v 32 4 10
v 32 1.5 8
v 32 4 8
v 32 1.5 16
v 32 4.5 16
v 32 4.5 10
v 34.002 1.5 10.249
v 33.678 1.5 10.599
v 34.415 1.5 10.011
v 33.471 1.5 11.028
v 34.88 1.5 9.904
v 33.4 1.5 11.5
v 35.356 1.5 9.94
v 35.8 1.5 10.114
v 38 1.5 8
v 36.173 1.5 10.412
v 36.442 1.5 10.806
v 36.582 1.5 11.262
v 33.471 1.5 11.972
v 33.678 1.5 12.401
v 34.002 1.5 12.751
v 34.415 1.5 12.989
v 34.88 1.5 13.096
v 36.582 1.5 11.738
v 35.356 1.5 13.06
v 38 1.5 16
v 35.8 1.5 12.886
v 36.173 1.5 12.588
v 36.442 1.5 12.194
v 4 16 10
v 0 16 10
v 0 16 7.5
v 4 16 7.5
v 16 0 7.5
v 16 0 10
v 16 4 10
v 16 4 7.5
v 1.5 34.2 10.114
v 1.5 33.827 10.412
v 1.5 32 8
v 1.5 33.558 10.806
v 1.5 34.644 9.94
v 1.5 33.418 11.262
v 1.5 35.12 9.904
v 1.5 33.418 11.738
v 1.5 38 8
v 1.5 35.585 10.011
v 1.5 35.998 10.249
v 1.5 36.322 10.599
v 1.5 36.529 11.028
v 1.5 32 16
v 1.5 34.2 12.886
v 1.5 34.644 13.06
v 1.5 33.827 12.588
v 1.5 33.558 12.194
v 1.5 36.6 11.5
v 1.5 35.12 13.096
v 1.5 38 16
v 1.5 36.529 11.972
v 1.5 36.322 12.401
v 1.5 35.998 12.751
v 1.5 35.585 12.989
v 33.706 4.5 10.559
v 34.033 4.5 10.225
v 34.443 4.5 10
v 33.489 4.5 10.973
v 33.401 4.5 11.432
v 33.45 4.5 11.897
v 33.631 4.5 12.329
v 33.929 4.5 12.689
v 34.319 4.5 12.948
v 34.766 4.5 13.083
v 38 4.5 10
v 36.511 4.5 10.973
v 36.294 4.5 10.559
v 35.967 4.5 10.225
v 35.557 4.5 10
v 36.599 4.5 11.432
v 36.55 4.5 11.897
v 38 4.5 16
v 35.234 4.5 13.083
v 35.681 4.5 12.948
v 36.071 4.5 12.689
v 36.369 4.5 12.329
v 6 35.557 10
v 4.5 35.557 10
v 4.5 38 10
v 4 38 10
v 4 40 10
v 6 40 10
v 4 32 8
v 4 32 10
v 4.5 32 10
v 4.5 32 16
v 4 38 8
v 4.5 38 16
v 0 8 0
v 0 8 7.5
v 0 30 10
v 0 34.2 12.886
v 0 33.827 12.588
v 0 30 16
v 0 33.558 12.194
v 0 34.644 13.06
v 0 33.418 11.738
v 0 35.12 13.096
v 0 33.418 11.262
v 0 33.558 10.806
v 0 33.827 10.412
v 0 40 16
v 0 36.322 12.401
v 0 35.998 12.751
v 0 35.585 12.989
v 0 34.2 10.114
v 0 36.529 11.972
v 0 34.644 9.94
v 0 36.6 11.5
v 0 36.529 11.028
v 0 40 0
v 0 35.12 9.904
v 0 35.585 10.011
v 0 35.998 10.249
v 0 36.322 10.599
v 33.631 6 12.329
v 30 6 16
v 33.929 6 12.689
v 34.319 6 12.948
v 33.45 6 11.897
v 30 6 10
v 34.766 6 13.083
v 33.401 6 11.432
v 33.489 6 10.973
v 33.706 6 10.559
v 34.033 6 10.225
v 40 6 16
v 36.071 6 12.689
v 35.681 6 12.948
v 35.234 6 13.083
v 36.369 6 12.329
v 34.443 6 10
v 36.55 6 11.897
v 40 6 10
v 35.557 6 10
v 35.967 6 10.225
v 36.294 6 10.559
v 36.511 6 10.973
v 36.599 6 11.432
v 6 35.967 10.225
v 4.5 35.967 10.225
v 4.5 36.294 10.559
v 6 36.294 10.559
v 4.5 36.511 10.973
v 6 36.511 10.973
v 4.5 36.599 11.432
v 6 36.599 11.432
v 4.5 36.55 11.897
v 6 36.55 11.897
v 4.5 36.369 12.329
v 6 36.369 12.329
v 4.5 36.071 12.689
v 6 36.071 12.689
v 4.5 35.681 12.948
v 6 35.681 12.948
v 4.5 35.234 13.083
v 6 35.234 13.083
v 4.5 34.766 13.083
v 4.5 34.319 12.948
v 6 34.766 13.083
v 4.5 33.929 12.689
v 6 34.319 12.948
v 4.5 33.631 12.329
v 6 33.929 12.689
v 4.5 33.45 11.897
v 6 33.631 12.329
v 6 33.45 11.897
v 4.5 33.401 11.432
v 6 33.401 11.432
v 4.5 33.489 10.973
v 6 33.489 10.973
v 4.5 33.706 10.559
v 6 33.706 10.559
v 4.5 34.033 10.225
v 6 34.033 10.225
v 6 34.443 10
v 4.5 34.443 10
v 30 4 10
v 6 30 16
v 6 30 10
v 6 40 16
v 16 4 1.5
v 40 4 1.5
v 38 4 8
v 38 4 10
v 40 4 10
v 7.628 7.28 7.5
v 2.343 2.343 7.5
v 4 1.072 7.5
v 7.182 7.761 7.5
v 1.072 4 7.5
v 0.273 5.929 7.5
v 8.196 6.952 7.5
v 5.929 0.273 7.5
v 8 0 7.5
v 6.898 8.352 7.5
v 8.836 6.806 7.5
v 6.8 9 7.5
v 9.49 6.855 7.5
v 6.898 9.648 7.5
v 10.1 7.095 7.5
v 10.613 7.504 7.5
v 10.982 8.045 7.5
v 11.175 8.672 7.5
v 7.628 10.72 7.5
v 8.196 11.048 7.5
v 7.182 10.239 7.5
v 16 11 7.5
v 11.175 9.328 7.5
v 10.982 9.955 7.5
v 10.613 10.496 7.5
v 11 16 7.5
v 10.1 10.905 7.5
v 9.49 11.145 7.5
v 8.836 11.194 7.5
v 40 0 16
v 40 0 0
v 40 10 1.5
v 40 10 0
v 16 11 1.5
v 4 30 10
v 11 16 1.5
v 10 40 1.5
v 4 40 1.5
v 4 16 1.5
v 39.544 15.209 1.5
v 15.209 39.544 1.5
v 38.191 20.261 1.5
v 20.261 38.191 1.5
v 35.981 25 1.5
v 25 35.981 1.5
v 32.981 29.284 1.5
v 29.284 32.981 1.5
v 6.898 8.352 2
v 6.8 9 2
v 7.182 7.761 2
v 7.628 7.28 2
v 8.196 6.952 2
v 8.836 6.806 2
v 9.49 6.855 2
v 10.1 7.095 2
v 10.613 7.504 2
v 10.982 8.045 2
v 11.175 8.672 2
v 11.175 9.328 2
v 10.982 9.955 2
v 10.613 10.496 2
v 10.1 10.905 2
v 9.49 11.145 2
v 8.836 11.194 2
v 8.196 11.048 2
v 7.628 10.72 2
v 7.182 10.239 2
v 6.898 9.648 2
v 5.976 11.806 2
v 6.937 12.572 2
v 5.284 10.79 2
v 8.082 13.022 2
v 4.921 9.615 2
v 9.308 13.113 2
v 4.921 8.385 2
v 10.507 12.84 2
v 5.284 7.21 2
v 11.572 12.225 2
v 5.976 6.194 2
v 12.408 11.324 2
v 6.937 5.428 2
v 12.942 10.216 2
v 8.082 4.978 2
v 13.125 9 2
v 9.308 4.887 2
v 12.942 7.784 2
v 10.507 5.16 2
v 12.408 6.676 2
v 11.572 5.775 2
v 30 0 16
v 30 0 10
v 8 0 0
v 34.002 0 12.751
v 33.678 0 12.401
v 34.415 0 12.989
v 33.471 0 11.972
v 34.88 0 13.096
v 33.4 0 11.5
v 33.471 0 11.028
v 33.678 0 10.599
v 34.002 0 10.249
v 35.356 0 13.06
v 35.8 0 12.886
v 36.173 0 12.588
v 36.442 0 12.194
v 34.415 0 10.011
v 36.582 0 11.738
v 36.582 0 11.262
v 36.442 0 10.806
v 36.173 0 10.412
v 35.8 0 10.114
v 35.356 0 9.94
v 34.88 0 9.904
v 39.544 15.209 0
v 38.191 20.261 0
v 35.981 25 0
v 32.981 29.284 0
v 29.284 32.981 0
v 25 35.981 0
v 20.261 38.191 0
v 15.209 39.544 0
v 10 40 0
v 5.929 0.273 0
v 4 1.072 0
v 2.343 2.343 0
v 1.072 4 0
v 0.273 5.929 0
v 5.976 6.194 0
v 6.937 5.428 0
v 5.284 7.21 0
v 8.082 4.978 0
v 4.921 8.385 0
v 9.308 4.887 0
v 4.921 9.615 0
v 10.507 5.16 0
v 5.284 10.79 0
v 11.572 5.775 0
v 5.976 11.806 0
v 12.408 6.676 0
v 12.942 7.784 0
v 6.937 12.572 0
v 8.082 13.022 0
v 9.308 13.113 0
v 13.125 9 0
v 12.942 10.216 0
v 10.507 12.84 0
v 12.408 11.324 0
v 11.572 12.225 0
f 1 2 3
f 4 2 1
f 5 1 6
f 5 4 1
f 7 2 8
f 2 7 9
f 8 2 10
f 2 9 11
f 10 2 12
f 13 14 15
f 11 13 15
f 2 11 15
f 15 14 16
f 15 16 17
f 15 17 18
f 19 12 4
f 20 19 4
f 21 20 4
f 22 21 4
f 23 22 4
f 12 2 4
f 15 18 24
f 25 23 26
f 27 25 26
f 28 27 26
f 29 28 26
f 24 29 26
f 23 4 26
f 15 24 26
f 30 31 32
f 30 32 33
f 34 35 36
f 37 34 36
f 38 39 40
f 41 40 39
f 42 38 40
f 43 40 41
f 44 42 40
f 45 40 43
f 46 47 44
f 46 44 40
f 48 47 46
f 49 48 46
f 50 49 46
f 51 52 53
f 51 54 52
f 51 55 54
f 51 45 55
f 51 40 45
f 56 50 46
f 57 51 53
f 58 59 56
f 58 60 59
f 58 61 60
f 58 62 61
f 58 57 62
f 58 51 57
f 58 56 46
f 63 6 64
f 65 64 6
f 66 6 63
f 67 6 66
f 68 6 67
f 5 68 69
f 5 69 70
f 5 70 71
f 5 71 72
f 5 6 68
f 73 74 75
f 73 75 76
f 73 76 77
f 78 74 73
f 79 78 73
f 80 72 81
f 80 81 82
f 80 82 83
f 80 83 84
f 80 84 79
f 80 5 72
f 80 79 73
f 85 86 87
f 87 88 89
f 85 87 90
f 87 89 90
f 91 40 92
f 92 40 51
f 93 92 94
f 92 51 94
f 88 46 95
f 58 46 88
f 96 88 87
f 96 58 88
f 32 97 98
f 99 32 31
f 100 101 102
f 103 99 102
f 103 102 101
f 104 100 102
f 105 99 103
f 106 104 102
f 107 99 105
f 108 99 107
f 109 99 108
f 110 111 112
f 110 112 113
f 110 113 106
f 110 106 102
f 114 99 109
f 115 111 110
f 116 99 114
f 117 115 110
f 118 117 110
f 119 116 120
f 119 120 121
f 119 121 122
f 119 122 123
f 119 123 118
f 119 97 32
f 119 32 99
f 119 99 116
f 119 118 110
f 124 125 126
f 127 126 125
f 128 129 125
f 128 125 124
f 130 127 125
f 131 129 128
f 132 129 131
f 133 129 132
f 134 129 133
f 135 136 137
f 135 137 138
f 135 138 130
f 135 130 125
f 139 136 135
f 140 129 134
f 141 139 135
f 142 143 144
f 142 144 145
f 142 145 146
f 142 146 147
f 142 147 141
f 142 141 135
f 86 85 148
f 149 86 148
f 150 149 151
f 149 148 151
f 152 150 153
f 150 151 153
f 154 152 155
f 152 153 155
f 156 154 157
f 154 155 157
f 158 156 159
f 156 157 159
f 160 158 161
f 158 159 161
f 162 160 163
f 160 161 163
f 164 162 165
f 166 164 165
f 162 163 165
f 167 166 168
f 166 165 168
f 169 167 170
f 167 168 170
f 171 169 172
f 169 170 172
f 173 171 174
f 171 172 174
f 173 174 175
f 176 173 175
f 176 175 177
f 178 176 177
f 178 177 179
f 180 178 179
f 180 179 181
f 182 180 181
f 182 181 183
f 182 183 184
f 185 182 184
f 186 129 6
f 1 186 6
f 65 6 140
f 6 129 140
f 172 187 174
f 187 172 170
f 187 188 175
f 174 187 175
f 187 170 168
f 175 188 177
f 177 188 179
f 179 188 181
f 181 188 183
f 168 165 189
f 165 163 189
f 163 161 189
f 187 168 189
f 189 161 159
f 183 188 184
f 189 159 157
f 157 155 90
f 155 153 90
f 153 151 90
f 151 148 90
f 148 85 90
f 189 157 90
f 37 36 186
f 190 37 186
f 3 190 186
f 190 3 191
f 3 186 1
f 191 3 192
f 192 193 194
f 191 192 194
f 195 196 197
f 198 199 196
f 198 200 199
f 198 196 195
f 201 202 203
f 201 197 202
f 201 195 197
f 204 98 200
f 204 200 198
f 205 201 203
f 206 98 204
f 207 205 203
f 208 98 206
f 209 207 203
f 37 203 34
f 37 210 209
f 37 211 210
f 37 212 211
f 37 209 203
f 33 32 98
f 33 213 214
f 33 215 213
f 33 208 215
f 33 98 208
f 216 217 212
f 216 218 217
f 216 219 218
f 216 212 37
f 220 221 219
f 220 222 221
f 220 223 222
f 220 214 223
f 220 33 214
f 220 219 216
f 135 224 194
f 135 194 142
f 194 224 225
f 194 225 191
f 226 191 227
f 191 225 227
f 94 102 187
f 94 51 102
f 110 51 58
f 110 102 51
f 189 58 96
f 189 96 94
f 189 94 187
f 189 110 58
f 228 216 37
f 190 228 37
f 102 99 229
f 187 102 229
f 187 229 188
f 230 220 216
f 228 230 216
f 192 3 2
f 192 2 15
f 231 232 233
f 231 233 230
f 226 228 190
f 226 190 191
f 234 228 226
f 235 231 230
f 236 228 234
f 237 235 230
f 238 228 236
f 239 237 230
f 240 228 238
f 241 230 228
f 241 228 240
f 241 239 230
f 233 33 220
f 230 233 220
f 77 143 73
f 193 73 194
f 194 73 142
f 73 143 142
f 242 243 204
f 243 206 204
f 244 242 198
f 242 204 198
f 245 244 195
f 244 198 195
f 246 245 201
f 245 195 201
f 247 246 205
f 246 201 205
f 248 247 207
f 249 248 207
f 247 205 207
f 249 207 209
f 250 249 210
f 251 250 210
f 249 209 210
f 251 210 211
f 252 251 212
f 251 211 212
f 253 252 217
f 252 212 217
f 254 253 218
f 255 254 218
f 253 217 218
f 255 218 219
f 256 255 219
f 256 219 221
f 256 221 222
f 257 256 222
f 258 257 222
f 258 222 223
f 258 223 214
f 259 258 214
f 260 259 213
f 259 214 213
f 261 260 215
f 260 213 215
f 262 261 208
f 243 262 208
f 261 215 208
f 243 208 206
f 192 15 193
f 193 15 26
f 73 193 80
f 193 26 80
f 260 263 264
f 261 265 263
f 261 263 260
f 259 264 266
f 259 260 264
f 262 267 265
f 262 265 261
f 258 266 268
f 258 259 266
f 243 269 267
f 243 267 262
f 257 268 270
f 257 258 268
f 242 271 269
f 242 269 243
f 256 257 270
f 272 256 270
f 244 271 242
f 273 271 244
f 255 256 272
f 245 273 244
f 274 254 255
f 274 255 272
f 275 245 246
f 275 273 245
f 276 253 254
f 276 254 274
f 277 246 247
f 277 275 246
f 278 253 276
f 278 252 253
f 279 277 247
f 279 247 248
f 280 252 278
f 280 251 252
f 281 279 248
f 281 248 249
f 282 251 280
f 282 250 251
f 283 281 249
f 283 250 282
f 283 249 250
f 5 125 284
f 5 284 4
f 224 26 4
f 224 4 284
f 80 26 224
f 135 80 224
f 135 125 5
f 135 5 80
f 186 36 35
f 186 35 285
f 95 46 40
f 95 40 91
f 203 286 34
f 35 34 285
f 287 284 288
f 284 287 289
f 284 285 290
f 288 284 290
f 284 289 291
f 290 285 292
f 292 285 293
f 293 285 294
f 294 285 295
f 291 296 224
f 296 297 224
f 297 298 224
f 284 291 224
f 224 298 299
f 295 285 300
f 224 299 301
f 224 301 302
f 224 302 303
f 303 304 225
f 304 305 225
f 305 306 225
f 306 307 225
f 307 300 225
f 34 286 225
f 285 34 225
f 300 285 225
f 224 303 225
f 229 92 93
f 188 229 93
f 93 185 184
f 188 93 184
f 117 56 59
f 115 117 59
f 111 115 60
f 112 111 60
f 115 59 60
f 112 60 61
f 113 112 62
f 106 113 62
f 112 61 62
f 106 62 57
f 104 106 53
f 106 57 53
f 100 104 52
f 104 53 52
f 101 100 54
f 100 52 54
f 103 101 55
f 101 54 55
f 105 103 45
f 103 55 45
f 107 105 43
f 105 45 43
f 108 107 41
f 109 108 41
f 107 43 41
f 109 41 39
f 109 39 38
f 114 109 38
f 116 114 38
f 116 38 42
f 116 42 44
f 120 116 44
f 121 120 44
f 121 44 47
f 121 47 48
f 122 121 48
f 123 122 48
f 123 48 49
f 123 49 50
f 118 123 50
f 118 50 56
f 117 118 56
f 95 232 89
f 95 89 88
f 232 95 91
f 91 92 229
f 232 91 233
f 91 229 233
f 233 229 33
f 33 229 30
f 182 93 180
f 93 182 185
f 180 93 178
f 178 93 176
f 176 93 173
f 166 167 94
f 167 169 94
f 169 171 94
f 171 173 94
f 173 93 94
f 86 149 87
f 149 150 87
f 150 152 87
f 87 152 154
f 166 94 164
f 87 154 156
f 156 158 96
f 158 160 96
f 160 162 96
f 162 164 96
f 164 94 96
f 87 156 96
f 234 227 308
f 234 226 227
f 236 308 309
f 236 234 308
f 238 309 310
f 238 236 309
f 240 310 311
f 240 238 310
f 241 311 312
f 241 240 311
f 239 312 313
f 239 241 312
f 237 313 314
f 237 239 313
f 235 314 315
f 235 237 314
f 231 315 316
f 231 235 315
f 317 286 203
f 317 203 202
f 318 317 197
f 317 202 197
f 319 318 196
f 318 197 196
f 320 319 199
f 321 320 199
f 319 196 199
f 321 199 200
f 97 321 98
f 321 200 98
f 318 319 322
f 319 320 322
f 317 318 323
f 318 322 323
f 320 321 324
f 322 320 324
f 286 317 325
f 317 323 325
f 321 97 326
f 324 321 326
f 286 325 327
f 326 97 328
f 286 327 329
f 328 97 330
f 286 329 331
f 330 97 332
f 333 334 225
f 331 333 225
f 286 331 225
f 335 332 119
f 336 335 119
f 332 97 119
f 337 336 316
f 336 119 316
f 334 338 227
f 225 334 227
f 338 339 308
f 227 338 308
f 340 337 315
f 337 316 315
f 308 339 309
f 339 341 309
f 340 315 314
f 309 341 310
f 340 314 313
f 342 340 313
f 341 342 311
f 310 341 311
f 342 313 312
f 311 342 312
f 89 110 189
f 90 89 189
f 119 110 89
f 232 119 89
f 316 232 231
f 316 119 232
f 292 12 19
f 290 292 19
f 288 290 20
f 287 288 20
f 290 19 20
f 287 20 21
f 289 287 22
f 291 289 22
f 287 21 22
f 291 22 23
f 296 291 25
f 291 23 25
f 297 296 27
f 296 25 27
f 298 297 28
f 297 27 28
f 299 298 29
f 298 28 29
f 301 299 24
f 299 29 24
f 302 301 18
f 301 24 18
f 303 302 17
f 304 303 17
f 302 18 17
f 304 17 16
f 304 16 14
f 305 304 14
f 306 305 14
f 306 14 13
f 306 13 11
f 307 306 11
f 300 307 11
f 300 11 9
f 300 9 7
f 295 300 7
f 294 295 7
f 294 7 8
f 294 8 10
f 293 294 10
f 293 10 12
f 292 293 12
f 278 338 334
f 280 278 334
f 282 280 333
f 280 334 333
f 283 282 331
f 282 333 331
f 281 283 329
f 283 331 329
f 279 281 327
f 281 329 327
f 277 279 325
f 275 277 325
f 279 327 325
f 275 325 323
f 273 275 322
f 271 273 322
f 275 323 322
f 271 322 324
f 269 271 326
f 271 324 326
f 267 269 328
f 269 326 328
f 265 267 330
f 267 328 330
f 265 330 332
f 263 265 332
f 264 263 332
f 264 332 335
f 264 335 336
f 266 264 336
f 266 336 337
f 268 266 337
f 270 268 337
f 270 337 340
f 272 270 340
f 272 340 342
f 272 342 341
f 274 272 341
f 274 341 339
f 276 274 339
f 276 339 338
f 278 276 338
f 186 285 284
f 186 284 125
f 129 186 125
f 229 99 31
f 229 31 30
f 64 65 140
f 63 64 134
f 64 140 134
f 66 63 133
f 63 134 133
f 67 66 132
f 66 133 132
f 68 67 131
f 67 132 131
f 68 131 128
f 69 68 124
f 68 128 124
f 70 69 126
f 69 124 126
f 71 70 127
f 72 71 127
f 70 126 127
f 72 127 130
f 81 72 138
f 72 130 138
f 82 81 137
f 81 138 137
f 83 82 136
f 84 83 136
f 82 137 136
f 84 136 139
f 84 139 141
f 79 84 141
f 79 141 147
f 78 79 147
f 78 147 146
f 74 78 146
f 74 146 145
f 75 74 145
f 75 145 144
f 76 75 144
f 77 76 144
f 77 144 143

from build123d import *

# Parameters (mm, degrees)
F0_W           = 40
F0_H           = 40
F1_DEPTH       = 10
F3_DEPTH       = 8.5
F4_W           = 16
F4_H           = 16
F5_DEPTH       = 2.5
F7_D           = 4.4
F7_CBORE_D     = 8.25
F7_CBORE_DEPTH = 2
F8_W           = 6
F8_H           = 10
F8_W_2         = 10
F8_H_2         = 6
F9_DEPTH       = 6
F11_D          = 3.2
F12_W          = 3
F12_H          = 6
F12_W_2        = 6
F12_H_2        = 3
F13_DEPTH      = 8
F15_D          = 3.2
F16_R          = 30
F17_R          = 8


with BuildPart() as f1:
    # F0 (on Top) → F1 (new body)
    with BuildSketch(Plane.XY):
        with Locations((20, 20)):
            Rectangle(F0_W, F0_H)
    extrude(amount=F1_DEPTH)

    # F2 (on face) → F3 (cut)
    with BuildSketch(Plane.XY.offset(10)):
        Polygon((40, 4), (40, 40), (4, 40), (4, 16), (11, 16), (16, 11), (16, 4), align=None)
    extrude(amount=-F3_DEPTH, mode=Mode.SUBTRACT)

    # F4 (on face) → F5 (cut)
    with BuildSketch(Plane.XY.offset(10)):
        with Locations((8, 8)):
            Rectangle(F4_W, F4_H)
    extrude(amount=-F5_DEPTH, mode=Mode.SUBTRACT)

    # F7 (through all)
    with Locations(Plane(origin=(0, 0, 0), x_dir=(1, 0, 0), z_dir=(0, 0, -1))):
        with Locations((9, -9)):
            CounterBoreHole(F7_D / 2, F7_CBORE_D / 2, F7_CBORE_DEPTH)

    # F8 (on face) → F9 (join)
    with BuildSketch(Plane.XY.offset(10)):
        with Locations((3, 35)):
            Rectangle(F8_W, F8_H)
        with Locations((35, 3)):
            Rectangle(F8_W_2, F8_H_2)
    extrude(amount=F9_DEPTH)

    # F11 (through all)
    with Locations(Plane(origin=(0, 0, 0), x_dir=(0, -1, 0), z_dir=(-1, 0, 0))):
        with Locations((-35, 11.5)):
            Hole(F11_D / 2)

    # F12 (on face) → F13 (cut)
    with BuildSketch(Plane.XY.offset(16)):
        with Locations((3, 35)):
            Rectangle(F12_W, F12_H)
        with Locations((35, 3)):
            Rectangle(F12_W_2, F12_H_2)
    extrude(amount=-F13_DEPTH, mode=Mode.SUBTRACT)

    # F15 (through all)
    with Locations(Plane.XZ):
        with Locations((35, 11.5)):
            Hole(F15_D / 2)

    # F16
    f16_edges = [f1.edges().sort_by_distance(p)[0] for p in [
        (40, 40, 0.75),
    ]]
    fillet(f16_edges, radius=F16_R)

    # F17
    f17_edges = [f1.edges().sort_by_distance(p)[0] for p in [
        (0, 0, 3.75),
    ]]
    fillet(f17_edges, radius=F17_R)


solid = f1.part
